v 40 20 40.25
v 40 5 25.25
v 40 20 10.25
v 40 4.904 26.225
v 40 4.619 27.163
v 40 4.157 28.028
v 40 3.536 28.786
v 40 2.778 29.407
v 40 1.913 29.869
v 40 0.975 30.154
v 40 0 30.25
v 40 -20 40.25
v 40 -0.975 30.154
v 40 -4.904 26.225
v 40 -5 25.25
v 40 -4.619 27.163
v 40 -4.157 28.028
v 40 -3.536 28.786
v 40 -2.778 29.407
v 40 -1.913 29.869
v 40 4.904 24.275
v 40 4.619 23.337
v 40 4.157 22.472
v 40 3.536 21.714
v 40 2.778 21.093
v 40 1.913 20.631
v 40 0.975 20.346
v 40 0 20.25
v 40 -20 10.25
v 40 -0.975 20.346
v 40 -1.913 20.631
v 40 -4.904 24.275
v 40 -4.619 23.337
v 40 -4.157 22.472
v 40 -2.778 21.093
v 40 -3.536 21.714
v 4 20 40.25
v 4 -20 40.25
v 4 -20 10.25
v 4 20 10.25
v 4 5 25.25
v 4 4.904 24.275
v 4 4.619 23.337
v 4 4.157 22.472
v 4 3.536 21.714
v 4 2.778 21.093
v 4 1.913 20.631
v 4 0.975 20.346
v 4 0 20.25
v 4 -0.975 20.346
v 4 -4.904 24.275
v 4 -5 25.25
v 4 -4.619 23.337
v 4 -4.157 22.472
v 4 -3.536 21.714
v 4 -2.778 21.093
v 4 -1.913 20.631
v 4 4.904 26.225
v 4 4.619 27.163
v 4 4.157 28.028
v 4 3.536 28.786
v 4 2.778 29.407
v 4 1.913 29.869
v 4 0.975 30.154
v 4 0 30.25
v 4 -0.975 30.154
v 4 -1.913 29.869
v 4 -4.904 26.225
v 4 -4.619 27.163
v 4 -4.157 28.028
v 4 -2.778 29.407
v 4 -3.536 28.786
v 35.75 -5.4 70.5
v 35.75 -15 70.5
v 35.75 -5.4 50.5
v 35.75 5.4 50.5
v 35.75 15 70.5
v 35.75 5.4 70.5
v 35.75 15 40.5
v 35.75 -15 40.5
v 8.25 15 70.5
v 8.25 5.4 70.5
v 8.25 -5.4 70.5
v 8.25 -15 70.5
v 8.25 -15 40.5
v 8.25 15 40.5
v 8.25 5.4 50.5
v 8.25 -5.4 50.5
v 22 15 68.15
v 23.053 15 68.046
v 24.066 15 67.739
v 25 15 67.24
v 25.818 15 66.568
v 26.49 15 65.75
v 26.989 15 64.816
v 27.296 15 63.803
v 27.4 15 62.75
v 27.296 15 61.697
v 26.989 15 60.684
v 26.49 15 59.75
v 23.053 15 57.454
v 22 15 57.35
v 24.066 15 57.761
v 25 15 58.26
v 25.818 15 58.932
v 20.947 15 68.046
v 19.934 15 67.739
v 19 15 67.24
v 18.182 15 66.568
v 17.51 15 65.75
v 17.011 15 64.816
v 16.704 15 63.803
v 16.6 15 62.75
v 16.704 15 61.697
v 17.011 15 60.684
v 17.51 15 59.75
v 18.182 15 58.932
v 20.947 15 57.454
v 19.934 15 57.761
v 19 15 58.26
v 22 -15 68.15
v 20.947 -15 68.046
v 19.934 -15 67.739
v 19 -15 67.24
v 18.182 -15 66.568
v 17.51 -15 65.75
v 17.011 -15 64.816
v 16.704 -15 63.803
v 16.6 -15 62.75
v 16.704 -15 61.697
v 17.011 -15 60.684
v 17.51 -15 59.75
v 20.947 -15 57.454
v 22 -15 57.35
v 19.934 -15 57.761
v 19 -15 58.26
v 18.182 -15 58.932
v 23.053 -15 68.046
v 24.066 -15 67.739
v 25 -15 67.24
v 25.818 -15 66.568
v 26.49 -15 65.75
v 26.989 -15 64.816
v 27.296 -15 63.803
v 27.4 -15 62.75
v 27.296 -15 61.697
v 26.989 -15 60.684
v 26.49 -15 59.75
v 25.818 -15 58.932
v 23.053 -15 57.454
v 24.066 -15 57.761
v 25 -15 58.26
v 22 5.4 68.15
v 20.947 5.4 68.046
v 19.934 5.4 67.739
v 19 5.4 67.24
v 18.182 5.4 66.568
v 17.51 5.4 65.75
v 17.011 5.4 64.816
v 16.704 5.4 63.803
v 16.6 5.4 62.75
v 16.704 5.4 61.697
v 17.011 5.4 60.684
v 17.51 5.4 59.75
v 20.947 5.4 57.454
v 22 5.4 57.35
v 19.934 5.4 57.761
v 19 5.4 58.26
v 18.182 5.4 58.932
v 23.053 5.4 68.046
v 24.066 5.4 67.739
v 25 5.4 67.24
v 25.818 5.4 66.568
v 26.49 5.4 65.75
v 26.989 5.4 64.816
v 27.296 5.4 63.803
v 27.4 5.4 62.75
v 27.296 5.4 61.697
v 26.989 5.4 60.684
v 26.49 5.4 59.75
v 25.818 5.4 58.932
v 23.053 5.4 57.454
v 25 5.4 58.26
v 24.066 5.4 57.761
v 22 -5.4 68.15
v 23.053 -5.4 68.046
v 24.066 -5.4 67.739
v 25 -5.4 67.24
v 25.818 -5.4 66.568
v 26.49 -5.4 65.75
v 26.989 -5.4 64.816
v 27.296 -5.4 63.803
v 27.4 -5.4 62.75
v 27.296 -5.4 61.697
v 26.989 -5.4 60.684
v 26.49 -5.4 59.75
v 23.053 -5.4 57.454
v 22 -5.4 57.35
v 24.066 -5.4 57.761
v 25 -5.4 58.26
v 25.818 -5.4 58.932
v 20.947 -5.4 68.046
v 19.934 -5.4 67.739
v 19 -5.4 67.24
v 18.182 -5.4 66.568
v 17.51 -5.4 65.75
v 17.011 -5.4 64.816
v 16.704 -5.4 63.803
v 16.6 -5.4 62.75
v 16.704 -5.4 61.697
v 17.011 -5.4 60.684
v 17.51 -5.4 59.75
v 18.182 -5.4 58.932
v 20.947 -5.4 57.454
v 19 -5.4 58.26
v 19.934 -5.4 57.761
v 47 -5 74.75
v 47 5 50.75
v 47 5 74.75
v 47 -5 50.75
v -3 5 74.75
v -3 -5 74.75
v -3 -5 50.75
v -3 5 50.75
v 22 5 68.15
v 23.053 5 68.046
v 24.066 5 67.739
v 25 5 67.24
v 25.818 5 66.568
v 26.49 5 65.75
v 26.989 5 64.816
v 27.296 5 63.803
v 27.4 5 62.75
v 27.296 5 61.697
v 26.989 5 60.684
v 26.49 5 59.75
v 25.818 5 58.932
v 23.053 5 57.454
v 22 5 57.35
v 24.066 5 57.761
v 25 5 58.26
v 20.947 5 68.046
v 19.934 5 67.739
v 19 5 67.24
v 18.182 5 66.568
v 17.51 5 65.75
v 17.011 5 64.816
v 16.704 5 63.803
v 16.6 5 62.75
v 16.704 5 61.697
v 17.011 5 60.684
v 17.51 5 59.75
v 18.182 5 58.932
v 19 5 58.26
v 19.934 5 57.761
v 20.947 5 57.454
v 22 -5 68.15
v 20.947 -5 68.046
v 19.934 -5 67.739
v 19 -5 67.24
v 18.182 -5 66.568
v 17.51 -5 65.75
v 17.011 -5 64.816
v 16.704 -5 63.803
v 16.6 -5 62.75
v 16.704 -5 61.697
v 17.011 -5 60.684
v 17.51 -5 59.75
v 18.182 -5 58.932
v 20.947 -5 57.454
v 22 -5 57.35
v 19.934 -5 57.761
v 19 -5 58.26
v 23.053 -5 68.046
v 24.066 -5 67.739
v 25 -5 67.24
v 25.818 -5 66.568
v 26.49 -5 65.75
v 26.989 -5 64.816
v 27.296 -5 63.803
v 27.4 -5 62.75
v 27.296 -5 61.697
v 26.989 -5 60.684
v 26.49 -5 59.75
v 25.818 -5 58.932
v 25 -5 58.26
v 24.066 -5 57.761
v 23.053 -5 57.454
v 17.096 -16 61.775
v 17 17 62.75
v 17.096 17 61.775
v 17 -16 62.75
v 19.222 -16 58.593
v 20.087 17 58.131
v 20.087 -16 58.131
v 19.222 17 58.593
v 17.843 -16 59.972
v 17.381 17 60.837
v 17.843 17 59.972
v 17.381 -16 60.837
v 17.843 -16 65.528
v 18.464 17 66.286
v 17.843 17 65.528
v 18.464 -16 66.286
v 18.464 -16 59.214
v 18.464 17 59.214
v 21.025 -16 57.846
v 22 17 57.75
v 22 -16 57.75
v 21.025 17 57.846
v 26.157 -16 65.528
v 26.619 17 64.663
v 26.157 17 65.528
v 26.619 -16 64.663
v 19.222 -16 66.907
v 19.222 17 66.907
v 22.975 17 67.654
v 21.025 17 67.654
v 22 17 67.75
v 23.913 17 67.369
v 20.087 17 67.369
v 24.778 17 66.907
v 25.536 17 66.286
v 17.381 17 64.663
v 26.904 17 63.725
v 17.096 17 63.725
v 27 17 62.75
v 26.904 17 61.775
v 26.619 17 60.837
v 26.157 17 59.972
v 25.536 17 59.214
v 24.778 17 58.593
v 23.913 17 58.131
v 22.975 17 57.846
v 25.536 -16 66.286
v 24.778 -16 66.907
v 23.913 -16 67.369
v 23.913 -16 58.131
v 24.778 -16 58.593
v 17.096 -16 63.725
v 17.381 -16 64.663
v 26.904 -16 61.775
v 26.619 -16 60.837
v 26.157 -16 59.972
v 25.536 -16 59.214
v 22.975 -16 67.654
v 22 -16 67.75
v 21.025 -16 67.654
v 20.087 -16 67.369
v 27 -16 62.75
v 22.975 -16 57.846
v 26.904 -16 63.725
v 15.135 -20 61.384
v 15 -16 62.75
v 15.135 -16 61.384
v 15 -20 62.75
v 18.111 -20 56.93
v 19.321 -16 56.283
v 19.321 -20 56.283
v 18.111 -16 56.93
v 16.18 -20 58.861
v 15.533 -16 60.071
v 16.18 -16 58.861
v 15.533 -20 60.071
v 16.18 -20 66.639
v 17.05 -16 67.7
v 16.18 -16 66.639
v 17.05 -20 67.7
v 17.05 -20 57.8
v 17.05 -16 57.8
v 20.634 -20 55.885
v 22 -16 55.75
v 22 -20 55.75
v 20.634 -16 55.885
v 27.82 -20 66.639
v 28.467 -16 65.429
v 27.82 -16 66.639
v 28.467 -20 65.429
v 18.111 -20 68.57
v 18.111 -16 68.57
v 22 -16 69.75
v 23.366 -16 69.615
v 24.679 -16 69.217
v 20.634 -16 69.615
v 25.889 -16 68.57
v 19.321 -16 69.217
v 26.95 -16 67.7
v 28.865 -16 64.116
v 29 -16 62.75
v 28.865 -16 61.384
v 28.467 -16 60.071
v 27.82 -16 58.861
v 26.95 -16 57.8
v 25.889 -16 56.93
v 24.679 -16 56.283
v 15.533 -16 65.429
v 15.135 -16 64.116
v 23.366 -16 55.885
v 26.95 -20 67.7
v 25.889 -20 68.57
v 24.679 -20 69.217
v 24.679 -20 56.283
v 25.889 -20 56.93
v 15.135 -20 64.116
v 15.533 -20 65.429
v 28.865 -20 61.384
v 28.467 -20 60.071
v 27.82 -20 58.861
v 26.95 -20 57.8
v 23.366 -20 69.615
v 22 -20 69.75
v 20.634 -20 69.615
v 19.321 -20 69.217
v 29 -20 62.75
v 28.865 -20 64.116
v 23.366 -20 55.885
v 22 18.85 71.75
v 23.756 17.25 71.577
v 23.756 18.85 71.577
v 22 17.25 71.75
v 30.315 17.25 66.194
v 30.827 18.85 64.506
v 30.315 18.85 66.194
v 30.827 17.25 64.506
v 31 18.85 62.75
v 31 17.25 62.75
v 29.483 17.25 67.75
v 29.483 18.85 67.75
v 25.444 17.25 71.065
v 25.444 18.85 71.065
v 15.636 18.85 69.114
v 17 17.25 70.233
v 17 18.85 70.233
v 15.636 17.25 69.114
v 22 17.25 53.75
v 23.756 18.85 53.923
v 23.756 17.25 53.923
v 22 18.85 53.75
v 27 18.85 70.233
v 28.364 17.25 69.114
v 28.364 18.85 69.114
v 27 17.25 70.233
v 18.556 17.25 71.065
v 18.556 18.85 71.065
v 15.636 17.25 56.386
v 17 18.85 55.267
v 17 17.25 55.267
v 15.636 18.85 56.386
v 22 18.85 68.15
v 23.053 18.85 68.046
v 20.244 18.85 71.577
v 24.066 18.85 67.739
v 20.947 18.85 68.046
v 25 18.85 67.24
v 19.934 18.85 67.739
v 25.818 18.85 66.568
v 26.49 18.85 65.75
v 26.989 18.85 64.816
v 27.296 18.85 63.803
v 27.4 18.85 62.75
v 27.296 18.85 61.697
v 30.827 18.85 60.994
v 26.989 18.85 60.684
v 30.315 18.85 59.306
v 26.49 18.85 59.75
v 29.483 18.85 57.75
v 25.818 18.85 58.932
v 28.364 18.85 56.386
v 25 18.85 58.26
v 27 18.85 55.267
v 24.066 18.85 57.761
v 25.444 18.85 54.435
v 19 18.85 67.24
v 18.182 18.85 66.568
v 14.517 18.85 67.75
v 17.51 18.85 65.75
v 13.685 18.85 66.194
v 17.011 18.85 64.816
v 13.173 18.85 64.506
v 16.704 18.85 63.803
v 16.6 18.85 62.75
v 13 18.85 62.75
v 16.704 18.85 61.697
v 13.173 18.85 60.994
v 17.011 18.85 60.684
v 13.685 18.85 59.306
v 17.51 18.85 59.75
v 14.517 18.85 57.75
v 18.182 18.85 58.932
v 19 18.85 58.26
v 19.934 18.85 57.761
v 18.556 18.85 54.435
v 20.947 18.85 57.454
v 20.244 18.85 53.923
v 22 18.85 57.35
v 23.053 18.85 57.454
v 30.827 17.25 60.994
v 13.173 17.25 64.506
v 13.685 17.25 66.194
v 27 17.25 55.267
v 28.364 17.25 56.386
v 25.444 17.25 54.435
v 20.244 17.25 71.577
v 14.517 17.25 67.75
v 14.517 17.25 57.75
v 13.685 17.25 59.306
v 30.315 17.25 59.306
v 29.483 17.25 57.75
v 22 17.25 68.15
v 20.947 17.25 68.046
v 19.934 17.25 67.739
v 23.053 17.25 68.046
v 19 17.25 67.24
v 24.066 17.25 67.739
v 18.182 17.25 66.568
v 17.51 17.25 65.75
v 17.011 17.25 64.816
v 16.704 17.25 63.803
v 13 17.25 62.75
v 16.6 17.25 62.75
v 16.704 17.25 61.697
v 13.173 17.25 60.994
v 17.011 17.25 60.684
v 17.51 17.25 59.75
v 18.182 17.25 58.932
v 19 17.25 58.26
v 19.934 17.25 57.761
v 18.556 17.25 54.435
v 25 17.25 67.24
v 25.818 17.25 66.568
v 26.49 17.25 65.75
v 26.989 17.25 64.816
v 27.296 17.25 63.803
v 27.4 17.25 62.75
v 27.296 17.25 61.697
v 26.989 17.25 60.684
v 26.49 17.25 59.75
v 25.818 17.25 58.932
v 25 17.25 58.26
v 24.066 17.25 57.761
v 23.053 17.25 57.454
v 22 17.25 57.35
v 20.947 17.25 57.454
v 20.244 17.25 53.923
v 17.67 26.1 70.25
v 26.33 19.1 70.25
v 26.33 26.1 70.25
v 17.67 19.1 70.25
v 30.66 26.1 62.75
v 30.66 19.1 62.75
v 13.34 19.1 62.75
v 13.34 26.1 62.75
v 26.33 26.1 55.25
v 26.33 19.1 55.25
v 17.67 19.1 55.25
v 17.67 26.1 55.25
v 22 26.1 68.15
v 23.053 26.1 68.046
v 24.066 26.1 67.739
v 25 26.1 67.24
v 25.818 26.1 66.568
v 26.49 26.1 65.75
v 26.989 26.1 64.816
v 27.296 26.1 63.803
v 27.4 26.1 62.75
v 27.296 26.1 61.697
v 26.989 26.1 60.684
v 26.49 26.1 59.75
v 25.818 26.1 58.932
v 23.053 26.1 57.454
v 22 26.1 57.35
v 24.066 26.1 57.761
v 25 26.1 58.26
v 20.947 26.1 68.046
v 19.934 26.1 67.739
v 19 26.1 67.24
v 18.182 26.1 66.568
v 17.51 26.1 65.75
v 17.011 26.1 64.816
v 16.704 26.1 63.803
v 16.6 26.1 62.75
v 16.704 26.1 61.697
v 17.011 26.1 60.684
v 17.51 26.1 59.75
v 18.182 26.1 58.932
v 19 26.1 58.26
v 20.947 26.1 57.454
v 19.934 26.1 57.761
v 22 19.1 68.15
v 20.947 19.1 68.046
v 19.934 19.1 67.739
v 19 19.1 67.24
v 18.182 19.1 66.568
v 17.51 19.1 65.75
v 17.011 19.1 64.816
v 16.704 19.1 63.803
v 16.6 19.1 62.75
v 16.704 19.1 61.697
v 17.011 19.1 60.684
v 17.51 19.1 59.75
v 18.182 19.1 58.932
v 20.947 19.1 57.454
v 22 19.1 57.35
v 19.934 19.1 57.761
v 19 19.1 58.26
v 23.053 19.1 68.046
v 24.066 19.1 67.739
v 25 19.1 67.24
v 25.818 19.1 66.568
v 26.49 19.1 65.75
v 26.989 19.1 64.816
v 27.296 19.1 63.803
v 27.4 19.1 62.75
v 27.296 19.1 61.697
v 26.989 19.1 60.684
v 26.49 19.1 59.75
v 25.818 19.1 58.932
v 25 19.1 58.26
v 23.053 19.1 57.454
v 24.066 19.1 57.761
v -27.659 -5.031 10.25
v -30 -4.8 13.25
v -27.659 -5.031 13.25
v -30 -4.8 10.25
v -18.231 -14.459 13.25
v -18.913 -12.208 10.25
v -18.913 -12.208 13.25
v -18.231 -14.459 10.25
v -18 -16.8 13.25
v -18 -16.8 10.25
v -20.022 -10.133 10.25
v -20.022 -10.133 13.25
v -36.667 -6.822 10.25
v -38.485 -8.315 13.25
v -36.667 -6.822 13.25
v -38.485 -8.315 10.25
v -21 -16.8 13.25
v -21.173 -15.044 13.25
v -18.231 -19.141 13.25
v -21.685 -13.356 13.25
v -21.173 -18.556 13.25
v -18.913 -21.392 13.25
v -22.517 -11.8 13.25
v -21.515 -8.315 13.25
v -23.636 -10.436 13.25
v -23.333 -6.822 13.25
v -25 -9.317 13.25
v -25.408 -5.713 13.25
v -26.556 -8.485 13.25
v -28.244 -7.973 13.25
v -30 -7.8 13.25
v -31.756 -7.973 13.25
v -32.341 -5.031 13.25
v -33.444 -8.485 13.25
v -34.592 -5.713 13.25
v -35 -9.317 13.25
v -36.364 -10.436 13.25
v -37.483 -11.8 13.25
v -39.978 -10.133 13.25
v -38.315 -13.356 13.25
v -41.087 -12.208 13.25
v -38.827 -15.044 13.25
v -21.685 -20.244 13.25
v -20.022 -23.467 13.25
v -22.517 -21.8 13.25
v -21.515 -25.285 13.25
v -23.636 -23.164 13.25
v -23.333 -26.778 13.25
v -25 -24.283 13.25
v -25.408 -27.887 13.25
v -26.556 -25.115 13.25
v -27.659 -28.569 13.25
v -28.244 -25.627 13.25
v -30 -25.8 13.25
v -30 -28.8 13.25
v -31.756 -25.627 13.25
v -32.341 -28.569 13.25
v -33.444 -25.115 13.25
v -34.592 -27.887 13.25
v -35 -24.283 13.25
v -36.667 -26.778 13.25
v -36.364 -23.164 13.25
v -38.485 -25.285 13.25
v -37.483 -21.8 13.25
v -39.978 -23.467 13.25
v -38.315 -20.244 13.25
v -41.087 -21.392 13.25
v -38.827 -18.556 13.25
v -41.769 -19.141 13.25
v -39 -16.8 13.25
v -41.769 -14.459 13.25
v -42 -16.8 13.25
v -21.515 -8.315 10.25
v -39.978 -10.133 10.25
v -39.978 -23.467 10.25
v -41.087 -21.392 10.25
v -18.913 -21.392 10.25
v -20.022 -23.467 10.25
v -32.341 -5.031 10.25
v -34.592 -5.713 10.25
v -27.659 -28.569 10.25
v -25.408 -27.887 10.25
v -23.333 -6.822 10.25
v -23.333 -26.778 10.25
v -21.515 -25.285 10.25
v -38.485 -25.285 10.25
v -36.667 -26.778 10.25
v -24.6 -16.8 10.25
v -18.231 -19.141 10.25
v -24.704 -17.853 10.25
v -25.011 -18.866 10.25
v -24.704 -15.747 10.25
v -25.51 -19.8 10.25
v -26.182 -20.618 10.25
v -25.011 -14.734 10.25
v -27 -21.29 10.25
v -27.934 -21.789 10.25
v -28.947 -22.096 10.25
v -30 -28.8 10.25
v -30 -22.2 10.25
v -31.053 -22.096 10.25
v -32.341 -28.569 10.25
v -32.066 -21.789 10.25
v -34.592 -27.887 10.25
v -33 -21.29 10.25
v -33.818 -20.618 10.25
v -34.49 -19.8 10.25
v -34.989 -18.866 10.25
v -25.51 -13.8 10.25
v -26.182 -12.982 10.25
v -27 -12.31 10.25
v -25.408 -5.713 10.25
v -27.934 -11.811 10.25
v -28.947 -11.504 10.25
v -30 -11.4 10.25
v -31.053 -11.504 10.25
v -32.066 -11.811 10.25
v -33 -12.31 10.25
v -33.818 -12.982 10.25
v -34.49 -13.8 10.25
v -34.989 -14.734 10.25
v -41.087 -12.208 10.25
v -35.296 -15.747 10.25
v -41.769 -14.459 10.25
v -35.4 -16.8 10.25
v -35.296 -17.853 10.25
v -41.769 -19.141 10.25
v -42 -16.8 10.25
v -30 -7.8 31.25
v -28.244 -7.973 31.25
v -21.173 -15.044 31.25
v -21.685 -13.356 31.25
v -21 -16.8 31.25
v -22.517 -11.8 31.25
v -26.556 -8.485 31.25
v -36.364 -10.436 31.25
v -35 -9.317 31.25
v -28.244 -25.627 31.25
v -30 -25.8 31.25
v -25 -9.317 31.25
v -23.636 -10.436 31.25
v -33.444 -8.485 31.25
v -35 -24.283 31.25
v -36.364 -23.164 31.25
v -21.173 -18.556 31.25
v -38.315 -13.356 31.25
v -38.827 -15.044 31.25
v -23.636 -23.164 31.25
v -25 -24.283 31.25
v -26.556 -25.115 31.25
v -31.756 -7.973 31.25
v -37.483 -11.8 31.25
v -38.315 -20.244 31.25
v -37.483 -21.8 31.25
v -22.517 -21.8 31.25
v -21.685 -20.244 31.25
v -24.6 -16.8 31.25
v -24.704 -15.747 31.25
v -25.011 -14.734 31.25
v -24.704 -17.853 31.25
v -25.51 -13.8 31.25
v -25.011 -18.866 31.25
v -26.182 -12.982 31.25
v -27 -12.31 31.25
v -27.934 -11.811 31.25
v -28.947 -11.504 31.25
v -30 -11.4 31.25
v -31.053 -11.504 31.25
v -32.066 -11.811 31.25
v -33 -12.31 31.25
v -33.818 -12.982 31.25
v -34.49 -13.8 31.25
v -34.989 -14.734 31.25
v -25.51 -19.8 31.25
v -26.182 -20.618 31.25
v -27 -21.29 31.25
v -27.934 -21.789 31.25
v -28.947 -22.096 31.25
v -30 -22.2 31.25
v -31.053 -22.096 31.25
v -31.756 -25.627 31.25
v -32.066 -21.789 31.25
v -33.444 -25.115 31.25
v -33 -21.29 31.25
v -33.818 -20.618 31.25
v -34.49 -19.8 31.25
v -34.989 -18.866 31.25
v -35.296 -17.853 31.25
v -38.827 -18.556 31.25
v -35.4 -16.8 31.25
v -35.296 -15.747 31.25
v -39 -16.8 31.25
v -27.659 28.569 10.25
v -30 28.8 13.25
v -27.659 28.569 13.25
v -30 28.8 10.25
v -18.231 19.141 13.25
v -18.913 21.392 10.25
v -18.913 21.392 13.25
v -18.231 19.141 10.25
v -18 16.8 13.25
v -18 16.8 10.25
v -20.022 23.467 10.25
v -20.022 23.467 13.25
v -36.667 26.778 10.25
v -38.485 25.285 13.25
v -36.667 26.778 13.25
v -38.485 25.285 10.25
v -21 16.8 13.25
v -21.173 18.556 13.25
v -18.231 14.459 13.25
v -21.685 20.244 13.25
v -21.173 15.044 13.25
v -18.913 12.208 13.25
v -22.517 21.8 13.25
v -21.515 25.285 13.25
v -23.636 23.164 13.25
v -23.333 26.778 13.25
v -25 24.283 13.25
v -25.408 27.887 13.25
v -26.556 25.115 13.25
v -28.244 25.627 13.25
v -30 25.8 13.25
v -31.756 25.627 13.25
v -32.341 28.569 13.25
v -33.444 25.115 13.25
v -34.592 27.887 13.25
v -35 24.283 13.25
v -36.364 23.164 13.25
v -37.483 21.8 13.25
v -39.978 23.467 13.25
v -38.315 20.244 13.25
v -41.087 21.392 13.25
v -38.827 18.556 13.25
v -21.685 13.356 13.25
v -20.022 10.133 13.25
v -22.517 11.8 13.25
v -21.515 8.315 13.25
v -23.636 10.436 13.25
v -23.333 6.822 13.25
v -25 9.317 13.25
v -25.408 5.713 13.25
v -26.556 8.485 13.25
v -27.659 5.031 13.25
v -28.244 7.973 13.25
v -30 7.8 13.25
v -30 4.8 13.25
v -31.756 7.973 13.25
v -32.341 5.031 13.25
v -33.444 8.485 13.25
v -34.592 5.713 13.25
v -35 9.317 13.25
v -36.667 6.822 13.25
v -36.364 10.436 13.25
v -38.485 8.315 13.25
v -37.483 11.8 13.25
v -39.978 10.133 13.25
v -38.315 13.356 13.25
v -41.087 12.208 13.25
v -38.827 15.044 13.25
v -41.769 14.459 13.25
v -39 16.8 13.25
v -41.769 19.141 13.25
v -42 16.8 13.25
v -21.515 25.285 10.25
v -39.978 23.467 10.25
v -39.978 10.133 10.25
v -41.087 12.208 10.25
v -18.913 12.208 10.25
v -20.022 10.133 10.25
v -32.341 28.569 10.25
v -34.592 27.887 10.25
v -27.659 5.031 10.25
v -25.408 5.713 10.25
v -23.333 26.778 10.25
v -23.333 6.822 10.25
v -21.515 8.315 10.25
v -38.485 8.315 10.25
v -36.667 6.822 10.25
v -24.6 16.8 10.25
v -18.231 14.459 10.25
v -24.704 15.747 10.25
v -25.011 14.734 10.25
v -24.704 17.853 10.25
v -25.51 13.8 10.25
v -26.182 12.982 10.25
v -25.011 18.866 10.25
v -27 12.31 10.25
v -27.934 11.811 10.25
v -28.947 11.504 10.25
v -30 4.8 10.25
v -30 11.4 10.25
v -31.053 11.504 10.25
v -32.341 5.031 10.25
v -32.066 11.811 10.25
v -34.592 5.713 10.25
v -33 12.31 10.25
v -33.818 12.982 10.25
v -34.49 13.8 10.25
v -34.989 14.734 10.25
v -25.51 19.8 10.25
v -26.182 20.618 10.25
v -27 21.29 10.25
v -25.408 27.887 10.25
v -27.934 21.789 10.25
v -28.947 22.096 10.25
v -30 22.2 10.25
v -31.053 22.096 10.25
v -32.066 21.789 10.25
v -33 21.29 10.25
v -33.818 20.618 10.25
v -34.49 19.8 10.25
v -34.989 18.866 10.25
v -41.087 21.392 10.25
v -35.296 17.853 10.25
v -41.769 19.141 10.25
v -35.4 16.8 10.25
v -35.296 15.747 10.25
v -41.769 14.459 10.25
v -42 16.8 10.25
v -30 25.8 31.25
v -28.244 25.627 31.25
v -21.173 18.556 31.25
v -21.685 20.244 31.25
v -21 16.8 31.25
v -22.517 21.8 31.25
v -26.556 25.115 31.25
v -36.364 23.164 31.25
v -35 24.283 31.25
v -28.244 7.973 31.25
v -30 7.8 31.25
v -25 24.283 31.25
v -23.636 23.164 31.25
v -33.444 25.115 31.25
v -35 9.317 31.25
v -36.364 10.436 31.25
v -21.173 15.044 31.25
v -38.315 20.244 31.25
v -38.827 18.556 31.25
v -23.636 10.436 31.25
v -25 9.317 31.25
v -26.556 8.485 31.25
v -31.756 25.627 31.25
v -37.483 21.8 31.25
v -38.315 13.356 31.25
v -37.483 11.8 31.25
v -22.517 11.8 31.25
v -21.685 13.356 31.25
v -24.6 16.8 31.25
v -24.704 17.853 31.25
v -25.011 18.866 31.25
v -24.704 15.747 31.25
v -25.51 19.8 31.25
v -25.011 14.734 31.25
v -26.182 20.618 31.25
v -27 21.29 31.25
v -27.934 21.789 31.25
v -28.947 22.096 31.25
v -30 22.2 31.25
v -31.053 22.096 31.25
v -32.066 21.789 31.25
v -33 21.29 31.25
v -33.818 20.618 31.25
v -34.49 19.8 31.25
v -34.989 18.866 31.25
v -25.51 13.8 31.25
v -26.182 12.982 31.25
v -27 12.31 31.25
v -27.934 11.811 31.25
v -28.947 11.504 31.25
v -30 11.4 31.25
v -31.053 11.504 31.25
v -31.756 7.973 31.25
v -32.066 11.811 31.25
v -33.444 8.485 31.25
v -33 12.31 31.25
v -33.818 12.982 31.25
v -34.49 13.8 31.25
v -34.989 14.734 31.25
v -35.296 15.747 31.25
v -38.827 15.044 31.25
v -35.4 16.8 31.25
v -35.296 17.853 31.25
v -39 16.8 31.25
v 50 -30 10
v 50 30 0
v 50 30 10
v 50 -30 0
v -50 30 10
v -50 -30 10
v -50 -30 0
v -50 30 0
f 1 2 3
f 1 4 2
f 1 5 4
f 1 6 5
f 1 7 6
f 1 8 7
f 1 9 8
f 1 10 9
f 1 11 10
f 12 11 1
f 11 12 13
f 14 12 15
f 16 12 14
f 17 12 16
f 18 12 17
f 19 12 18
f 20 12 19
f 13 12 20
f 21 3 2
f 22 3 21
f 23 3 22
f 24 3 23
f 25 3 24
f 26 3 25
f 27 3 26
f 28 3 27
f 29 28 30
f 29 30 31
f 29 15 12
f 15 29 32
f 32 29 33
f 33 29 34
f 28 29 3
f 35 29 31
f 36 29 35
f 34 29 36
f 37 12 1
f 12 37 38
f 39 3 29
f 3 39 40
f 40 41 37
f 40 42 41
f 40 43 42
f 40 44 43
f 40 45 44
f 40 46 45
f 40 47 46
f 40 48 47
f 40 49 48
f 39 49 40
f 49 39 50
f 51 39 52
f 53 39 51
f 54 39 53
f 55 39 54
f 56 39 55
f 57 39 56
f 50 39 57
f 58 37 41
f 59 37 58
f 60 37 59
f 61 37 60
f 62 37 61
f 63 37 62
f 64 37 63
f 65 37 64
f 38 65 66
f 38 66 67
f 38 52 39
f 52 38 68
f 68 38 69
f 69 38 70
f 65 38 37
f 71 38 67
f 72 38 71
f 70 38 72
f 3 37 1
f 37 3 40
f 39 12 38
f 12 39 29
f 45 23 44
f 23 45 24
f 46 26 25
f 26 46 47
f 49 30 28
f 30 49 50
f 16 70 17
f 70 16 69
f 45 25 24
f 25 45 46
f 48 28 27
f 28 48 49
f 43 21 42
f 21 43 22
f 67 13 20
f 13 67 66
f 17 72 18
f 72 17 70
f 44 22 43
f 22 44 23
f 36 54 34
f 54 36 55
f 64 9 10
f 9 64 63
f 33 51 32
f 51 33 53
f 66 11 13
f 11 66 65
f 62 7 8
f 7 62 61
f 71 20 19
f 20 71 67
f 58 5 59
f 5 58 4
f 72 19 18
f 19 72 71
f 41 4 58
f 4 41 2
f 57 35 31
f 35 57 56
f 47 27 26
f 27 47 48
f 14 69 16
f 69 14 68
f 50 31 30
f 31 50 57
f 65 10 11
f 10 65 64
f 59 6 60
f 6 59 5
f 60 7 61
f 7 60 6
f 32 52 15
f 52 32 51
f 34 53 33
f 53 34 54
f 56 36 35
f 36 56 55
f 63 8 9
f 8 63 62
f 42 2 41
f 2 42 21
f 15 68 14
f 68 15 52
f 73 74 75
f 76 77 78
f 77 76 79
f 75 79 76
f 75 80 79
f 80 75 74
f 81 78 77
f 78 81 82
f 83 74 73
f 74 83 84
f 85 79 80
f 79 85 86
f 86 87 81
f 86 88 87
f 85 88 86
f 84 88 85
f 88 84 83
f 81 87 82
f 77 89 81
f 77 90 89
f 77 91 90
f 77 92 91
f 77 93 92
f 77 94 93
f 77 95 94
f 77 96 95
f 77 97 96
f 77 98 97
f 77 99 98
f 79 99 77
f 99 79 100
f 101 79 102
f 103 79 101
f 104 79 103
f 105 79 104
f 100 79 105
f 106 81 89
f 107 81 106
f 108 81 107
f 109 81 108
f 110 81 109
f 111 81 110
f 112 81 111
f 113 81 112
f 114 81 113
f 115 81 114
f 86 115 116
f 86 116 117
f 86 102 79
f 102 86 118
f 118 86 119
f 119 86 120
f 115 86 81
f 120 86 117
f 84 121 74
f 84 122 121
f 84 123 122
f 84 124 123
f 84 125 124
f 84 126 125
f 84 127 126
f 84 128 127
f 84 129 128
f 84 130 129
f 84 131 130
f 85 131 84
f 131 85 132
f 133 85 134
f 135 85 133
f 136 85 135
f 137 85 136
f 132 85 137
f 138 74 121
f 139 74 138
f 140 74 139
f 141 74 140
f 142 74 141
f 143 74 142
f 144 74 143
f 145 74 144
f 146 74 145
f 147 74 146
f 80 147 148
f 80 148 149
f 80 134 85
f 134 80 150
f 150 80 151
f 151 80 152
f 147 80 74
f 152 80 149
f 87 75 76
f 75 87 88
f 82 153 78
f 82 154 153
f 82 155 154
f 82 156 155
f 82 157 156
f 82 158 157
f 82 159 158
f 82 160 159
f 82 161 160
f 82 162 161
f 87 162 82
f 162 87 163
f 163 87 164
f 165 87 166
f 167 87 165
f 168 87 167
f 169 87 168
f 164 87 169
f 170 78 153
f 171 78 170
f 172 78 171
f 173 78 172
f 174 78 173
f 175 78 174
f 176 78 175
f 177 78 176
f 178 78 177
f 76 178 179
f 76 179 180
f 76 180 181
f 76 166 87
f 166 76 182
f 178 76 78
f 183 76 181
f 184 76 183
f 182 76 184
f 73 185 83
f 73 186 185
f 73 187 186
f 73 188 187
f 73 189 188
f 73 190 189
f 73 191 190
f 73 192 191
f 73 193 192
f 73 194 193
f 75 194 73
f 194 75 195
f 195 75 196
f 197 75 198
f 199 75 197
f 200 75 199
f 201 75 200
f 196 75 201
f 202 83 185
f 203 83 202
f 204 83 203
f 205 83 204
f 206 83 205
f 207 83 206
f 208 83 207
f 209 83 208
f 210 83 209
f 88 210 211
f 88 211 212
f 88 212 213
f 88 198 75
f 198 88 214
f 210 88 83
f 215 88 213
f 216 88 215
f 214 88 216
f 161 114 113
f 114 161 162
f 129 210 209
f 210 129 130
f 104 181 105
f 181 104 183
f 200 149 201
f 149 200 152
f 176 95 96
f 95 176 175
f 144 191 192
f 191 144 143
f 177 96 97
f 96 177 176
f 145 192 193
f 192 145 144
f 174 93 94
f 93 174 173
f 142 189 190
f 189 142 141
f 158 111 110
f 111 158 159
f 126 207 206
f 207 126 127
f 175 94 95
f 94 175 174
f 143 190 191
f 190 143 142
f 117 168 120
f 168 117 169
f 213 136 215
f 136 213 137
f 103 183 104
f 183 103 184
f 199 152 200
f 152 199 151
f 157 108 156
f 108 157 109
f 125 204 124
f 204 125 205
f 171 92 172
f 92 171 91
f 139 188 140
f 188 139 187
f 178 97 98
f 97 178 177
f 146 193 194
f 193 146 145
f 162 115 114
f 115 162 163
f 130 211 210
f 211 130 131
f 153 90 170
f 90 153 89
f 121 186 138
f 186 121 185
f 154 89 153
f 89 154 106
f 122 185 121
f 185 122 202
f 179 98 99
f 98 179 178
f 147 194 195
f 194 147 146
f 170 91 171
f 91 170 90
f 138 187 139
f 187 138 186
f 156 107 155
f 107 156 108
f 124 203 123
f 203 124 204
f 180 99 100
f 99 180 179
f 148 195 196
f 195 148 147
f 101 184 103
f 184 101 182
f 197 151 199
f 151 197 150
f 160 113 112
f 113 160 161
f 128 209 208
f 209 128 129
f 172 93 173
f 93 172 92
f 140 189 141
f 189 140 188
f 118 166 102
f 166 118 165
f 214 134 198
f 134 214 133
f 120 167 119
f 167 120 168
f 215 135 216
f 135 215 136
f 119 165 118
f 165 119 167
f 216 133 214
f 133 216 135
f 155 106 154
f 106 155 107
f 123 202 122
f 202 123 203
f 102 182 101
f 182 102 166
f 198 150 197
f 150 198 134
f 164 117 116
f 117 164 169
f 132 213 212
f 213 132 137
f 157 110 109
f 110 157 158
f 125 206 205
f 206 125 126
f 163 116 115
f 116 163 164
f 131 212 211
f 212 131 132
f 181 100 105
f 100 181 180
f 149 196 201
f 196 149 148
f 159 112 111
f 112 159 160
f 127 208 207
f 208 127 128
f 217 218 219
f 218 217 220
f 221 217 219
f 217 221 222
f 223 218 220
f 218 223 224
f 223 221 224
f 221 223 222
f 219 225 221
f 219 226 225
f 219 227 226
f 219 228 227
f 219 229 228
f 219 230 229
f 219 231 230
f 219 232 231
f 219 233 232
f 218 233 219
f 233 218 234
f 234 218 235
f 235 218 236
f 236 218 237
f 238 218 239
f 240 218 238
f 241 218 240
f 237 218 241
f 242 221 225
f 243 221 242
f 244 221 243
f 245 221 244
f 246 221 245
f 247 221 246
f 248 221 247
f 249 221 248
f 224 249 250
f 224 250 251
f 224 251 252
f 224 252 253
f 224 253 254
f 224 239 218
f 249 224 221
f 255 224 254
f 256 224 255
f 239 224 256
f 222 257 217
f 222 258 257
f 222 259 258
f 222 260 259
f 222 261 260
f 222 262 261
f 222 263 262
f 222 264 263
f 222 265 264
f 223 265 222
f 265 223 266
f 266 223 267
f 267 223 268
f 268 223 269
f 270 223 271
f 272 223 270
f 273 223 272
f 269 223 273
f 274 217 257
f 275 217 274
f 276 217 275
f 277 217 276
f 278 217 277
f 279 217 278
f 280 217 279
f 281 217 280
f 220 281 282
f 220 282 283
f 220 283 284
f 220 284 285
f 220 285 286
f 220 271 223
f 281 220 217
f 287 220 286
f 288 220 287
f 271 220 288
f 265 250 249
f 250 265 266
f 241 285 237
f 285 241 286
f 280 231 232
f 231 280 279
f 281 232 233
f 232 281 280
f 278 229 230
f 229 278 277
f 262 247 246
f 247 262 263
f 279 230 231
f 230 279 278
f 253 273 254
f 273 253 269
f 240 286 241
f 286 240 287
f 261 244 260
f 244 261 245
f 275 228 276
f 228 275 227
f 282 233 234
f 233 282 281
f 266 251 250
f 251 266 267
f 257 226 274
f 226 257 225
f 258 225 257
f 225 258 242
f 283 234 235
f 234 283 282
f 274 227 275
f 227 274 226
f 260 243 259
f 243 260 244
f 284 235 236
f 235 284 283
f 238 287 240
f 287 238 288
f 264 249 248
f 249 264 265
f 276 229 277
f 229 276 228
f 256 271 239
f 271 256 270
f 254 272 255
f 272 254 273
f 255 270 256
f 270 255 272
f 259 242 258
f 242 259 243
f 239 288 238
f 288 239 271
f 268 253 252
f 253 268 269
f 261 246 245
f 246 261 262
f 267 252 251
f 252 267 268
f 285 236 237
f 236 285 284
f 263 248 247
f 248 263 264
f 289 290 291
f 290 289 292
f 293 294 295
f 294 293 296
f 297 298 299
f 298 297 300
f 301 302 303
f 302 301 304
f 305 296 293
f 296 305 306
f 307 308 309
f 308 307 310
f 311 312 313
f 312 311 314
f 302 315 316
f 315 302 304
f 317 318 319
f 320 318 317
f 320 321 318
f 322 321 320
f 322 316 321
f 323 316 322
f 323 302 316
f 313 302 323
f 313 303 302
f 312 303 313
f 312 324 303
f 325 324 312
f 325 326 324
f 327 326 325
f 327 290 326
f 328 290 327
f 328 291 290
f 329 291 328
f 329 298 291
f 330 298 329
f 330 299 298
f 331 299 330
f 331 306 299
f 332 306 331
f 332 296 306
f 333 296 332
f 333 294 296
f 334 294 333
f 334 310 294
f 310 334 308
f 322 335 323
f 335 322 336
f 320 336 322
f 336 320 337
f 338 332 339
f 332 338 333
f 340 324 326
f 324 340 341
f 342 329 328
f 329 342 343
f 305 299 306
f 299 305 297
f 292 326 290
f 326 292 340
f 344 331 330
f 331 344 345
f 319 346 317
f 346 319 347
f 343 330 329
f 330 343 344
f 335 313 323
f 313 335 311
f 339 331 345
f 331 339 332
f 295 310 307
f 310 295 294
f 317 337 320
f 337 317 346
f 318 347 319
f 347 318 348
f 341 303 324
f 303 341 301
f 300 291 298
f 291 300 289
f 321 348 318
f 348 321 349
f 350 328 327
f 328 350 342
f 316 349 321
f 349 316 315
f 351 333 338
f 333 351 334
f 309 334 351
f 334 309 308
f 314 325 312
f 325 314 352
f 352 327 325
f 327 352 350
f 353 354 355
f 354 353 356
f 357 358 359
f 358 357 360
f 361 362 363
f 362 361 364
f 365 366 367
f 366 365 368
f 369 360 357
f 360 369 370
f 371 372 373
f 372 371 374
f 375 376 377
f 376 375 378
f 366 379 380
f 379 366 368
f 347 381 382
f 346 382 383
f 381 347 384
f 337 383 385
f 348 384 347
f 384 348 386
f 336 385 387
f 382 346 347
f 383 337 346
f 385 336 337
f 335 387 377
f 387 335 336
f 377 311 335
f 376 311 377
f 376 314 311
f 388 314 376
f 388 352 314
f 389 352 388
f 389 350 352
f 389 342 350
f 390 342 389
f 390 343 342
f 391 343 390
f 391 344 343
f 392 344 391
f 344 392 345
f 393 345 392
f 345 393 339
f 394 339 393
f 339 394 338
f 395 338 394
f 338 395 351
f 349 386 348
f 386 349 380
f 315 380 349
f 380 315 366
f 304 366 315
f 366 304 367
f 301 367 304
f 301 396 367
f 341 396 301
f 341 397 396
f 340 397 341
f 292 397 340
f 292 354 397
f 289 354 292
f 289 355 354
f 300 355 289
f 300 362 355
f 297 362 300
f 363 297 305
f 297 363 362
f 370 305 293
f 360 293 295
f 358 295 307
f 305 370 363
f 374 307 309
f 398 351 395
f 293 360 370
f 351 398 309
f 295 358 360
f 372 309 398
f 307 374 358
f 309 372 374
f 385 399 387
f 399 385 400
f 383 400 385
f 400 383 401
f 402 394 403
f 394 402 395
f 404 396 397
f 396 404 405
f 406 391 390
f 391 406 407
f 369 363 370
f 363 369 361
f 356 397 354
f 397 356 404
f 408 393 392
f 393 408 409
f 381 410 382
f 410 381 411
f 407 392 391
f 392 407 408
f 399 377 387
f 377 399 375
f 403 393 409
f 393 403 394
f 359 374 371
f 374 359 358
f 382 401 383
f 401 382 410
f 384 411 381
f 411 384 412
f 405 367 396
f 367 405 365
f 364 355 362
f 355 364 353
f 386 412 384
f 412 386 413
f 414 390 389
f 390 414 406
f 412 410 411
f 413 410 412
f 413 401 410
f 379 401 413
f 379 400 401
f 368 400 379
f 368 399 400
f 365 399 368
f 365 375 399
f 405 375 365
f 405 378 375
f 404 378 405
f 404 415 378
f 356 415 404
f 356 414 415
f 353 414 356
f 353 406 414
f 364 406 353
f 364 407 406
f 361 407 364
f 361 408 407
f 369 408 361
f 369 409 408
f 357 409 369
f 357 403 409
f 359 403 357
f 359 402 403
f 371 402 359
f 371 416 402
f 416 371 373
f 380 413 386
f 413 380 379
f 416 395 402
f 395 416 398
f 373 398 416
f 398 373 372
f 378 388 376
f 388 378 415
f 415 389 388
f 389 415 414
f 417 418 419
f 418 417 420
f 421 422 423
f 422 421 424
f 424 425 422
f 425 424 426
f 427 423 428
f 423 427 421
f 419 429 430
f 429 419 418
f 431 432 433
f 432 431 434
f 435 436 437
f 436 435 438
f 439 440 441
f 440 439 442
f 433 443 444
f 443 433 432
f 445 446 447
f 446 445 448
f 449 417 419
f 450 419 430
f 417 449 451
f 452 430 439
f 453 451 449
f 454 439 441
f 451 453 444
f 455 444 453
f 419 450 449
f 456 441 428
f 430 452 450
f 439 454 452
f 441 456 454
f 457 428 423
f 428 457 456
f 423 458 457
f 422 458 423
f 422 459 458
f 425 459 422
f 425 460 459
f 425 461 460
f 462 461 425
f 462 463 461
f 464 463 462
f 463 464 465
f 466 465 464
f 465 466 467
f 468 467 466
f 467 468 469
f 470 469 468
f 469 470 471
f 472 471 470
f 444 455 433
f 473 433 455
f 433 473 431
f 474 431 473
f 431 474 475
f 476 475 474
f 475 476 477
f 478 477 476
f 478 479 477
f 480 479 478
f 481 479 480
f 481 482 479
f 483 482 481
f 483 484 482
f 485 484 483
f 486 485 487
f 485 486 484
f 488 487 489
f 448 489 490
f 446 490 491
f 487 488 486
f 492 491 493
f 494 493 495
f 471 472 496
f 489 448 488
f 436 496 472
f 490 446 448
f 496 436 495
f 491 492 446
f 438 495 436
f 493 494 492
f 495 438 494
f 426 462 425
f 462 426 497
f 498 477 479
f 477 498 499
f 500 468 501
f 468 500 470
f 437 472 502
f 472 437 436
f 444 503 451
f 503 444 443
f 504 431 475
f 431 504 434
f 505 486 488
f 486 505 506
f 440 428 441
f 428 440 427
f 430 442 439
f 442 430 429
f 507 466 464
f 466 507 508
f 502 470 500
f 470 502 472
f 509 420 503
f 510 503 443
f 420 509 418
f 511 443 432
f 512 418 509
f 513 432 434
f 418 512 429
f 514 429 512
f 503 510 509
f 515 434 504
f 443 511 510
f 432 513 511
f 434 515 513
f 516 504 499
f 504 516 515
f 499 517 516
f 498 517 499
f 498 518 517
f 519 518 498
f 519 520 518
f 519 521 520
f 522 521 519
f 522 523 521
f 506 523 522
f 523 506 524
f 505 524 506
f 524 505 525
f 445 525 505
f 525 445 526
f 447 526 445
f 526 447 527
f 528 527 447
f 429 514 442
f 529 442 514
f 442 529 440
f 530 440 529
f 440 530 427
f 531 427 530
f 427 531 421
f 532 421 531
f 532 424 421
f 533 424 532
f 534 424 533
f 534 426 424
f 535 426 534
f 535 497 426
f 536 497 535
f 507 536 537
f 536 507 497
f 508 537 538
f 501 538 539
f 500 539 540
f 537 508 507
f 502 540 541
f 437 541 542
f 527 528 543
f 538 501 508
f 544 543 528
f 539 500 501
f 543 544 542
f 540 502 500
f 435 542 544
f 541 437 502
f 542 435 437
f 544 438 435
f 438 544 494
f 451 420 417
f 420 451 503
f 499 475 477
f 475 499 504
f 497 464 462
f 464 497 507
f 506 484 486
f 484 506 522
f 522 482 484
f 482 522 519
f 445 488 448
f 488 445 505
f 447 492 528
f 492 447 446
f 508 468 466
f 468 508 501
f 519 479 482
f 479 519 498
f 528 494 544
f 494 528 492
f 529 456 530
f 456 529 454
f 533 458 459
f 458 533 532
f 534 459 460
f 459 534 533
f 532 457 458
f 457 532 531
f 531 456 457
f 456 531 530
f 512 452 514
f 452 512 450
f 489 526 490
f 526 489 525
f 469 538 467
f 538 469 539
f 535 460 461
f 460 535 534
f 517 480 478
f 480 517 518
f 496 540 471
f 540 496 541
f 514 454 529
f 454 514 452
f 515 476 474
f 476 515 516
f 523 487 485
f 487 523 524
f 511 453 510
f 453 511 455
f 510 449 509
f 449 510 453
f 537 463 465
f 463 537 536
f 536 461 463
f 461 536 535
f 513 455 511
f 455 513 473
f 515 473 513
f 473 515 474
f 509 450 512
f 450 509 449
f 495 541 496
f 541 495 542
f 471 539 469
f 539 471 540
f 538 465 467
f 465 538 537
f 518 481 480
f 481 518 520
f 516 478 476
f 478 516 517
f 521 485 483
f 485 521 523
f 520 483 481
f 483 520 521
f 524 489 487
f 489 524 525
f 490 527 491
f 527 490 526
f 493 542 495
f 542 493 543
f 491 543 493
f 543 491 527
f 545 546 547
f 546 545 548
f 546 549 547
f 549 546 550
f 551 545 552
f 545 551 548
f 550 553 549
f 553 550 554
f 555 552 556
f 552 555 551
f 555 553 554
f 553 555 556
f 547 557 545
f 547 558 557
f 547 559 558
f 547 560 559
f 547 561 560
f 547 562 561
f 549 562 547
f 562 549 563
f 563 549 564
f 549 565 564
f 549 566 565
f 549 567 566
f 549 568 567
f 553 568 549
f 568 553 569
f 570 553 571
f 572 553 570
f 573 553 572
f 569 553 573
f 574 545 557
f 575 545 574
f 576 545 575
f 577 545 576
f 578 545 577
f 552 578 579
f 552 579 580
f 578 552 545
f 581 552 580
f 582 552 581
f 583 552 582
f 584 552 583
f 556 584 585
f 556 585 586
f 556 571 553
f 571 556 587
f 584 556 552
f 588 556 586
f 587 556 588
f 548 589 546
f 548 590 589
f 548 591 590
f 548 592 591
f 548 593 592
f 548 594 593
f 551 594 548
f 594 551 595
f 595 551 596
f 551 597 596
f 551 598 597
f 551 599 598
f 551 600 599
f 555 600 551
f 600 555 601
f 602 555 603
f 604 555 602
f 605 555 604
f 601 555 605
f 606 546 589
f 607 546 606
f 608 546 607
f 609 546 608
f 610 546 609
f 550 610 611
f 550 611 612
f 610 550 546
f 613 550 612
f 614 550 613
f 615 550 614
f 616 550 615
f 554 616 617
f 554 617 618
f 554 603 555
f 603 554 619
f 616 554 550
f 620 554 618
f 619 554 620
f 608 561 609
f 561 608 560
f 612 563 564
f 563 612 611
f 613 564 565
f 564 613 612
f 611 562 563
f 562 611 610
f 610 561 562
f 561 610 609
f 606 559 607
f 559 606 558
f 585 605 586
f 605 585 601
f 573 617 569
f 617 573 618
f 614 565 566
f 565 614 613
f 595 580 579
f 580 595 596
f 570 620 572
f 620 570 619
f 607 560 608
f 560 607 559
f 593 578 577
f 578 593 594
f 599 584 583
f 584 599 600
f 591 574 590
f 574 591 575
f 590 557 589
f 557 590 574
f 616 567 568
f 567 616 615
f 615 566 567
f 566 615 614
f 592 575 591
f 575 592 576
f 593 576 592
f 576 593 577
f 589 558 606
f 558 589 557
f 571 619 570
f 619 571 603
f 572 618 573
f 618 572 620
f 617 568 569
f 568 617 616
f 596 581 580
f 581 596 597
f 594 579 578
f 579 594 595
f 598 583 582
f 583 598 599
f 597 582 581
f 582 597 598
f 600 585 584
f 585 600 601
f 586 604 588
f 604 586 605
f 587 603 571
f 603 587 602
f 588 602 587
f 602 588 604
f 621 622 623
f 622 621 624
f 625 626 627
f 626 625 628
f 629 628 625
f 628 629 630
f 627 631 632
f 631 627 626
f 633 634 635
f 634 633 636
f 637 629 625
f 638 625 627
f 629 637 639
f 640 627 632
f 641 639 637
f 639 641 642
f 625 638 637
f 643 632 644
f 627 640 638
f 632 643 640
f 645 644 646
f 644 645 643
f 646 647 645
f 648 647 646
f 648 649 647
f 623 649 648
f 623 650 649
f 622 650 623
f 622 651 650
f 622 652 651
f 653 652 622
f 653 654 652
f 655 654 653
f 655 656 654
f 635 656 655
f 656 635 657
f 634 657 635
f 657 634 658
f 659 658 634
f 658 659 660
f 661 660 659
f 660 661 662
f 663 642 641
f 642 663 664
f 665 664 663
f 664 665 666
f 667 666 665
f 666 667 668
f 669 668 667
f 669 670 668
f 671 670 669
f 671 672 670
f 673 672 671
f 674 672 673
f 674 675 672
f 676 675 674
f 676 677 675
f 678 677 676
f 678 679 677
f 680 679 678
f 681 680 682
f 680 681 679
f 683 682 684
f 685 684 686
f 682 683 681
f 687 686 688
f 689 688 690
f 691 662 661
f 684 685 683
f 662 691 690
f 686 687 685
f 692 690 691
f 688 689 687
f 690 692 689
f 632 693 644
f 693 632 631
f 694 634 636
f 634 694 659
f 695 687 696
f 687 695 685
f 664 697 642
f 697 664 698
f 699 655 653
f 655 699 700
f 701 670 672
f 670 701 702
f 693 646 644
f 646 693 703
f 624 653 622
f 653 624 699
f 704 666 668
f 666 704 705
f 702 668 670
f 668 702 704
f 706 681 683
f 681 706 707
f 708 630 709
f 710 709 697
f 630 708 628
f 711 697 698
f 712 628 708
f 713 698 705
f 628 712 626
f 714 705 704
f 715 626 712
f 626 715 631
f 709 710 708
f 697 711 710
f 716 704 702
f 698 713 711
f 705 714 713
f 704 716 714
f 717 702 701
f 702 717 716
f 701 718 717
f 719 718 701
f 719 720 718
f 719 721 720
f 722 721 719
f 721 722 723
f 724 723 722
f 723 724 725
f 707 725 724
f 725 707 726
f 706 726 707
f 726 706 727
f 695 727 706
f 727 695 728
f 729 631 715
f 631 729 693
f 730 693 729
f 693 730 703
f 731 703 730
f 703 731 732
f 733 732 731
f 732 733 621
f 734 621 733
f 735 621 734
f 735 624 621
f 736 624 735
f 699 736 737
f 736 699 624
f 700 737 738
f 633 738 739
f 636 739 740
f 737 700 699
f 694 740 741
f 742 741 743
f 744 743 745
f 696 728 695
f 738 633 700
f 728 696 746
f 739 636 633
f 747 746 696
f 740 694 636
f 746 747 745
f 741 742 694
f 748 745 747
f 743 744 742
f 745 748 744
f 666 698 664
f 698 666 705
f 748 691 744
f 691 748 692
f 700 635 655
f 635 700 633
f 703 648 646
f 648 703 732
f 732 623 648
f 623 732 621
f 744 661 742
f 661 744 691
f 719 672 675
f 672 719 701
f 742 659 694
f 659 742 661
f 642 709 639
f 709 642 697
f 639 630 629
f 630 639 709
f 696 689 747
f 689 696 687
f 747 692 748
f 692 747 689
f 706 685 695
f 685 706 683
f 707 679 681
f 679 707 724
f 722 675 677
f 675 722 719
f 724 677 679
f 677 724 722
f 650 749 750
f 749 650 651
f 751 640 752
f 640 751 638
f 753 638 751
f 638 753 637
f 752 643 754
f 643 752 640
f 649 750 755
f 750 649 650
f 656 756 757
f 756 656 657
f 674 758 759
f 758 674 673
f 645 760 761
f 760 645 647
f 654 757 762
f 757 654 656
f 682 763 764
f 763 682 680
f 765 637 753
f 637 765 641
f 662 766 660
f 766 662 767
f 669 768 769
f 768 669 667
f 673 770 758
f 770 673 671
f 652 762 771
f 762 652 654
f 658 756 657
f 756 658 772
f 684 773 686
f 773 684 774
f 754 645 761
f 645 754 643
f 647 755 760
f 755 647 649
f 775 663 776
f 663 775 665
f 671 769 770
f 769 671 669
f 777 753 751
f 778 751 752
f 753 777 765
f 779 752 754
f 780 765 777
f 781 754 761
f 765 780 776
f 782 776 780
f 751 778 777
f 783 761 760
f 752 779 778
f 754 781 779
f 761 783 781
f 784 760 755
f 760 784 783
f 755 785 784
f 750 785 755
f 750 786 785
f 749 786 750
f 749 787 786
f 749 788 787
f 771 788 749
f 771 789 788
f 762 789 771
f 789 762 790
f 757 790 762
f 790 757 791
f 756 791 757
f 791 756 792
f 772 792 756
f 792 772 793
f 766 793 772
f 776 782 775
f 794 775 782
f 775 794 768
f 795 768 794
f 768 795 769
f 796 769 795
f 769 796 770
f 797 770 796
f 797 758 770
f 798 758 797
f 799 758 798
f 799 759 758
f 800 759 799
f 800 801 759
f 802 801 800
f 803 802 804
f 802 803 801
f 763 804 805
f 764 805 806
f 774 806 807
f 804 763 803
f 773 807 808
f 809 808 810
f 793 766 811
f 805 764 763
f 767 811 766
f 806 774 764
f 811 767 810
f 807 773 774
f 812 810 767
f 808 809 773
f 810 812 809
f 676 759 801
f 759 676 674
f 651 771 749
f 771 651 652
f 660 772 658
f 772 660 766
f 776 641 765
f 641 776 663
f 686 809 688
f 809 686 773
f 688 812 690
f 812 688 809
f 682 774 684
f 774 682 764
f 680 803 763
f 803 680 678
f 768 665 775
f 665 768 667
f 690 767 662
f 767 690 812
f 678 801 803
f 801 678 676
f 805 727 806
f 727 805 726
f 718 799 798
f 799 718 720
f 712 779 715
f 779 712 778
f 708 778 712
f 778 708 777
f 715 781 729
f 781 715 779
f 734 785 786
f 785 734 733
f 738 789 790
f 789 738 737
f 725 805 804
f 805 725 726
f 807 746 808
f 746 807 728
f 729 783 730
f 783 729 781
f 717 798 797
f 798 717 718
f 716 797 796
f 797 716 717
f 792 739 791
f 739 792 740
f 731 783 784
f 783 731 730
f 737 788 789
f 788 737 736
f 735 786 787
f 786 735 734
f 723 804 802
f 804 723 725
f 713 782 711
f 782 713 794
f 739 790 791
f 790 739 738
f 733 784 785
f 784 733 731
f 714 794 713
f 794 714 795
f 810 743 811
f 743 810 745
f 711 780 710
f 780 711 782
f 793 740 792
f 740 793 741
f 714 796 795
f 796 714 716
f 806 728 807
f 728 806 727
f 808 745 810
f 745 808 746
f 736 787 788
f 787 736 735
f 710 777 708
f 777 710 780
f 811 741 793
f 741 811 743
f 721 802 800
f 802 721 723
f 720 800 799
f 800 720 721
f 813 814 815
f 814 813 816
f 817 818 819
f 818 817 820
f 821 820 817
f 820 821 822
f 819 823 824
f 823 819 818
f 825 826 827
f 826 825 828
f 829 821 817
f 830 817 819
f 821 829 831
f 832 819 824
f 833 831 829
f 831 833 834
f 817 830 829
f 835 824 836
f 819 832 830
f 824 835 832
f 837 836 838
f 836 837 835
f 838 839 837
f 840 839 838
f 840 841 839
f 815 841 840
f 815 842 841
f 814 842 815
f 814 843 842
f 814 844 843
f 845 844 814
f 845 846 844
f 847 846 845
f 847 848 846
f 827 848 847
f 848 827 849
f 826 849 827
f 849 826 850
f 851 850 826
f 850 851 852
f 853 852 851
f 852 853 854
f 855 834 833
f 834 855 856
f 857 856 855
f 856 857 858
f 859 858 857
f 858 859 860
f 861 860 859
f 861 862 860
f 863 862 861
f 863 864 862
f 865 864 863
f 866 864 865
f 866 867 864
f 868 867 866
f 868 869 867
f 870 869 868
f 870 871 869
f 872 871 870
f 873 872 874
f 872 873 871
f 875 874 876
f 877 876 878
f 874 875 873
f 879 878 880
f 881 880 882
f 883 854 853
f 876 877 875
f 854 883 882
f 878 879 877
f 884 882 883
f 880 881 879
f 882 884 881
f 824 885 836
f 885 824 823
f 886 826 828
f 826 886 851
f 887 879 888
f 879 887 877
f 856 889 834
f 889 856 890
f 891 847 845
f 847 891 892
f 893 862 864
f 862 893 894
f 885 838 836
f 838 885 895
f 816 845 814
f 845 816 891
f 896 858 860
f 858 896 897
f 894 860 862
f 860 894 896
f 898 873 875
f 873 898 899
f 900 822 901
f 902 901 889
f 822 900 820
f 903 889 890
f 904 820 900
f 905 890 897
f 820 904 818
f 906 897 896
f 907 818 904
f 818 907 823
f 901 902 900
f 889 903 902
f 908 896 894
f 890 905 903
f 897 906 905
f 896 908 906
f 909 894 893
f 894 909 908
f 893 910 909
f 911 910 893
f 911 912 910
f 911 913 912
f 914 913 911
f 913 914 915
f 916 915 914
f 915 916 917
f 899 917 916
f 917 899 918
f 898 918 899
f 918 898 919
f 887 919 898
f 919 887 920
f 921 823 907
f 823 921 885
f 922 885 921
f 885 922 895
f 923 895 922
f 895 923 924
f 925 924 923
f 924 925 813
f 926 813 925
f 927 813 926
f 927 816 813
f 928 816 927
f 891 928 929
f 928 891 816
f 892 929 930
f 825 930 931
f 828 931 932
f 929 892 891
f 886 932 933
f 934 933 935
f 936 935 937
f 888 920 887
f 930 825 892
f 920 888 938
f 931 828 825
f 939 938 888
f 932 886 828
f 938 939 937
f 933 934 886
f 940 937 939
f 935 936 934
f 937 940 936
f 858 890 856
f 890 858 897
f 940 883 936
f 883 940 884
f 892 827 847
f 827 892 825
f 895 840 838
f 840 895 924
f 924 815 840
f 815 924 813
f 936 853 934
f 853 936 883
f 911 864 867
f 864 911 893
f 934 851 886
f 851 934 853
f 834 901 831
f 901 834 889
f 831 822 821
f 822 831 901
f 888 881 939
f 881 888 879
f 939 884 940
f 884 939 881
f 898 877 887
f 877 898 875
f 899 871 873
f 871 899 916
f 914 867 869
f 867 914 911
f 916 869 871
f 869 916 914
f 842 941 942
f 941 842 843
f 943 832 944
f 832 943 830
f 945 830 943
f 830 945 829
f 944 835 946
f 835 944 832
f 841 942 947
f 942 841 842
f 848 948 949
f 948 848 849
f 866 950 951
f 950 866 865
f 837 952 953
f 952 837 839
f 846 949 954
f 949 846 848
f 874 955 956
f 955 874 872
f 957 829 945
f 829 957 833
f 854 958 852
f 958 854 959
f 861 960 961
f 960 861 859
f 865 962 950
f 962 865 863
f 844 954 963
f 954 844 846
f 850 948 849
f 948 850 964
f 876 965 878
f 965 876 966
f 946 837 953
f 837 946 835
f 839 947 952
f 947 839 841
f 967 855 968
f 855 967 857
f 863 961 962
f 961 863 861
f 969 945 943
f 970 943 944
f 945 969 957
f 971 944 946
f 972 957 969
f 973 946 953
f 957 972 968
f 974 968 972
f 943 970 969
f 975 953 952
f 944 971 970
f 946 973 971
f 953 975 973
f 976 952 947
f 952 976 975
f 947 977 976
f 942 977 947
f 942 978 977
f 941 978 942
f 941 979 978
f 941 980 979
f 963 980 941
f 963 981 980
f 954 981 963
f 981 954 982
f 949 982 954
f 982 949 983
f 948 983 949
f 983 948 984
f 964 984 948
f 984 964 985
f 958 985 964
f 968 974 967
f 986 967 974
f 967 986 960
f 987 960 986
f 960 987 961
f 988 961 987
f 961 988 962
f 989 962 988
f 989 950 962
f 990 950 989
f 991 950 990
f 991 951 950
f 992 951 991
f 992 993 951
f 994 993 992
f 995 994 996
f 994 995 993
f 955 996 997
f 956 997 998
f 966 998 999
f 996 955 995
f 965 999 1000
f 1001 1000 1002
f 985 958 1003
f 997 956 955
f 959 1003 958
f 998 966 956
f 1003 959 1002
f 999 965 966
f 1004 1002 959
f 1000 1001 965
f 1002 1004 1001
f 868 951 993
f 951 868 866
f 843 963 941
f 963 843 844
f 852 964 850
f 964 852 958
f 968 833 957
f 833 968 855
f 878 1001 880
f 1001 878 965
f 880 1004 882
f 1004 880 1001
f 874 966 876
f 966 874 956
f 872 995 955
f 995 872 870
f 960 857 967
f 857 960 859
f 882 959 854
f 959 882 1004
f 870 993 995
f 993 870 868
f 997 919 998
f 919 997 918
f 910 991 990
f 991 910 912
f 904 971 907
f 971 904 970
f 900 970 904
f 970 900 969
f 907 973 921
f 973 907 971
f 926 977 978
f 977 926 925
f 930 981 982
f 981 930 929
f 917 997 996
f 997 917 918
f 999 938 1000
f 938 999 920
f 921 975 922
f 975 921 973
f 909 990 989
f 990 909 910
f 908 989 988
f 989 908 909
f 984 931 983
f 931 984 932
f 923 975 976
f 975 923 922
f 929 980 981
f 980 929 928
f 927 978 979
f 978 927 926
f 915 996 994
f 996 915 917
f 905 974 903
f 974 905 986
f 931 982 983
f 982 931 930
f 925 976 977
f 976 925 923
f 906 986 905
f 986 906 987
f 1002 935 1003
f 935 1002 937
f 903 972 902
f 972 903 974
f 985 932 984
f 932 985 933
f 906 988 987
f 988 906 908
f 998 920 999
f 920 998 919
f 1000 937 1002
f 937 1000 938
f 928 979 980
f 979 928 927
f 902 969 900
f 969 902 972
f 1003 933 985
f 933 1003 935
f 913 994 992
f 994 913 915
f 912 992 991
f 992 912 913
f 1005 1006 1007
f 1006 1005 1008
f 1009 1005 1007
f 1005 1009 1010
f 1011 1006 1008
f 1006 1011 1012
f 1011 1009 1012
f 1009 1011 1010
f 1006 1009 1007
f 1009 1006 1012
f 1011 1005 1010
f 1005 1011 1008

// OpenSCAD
$fn = 32;

// ------------------------------------------------------------------------
// Indexing jig: plate 100 x 60 mm, pin d10
// Every part is its own module, assembly() places every instance.
// ------------------------------------------------------------------------

// --- part 1 ---
module jig_plate() {
  difference() {
    translate([-50, -30, 0]) cube([100, 60, 10]);
  }
}

// --- part 2 ---
module locator_block() {
  difference() {
    translate([-18, -20, 0]) cube([36, 40, 30]);
    translate([0, 0, 15]) rotate([0, 90, 0]) cylinder(h = 38, d = 10, center = true);
  }
}

// --- part 3 ---
module index_fork() {
  difference() {
    translate([-13.75, -15, 0]) cube([27.5, 30, 30]);
    translate([-14.75, -5.4, 10]) cube([29.5, 10.8, 21]);
    translate([0, 0, 22.25]) rotate([90, 0, 0]) cylinder(h = 32, d = 10.8, center = true);
  }
}

// --- part 4 ---
module index_arm() {
  difference() {
    translate([-25, -5, 0]) cube([50, 10, 24]);
    translate([0, 0, 12]) rotate([90, 0, 0]) cylinder(h = 12, d = 10.8, center = true);
  }
}

// --- part 5 ---
module index_pin() {
  rotate([0, 90, 0]) cylinder(h = 34, d = 10, center = true);
  translate([-20, 0, 0]) rotate([0, 90, 0]) cylinder(h = 4, d = 14);
}

// --- part 6 ---
module pin_washer() {
  difference() {
      translate([0, 0, 0]) cylinder(h = 1.6, d = 18);
      translate([0, 0, -1]) cylinder(h = 3.6, d = 10.8);
    }
}

// --- part 7 ---
module lock_nut() {
  difference() {
    linear_extrude(height = 7) polygon(points = [[8.66, 0], [4.33, 7.5], [-4.33, 7.5], [-8.66, 0], [-4.33, -7.5], [4.33, -7.5]]);
    translate([0, 0, -1]) cylinder(h = 9, d = 10.8);
  }
}

// --- part 8 ---
module guide_bush_a() {
  difference() {
    union() {
      cylinder(h = 3, d = 24);
      translate([0, 0, 3]) cylinder(h = 18, d = 18);
    }
    translate([0, 0, -1]) cylinder(h = 23, d = 10.8);
  }
}

// --- part 9 ---
module guide_bush_b() {
  difference() {
    union() {
      cylinder(h = 3, d = 24);
      translate([0, 0, 3]) cylinder(h = 18, d = 18);
    }
    translate([0, 0, -1]) cylinder(h = 23, d = 10.8);
  }
}

// --- assembly ---
module assembly() {
  color([0.80, 0.24, 0.20]) translate([0, 0, 0]) rotate([0, 0, 0]) jig_plate();
  color([0.20, 0.45, 0.75]) translate([22, 0, 10.25]) rotate([0, 0, 0]) locator_block();
  color([0.25, 0.62, 0.32]) translate([22, 0, 40.5]) rotate([0, 0, 0]) index_fork();
  color([0.92, 0.70, 0.18]) translate([22, 0, 50.75]) rotate([0, 0, 0]) index_arm();
  color([0.58, 0.35, 0.70]) translate([22, 0, 62.75]) rotate([0, 0, 90]) index_pin();
  color([0.16, 0.66, 0.66]) translate([22, 18.85, 62.75]) rotate([90, 0, 0]) pin_washer();
  color([0.85, 0.48, 0.18]) translate([22, 26.1, 62.75]) rotate([90, 0, 0]) lock_nut();
  color([0.55, 0.60, 0.65]) translate([-30, -16.8, 10.25]) rotate([0, 0, 0]) guide_bush_a();
  color([0.75, 0.30, 0.55]) translate([-30, 16.8, 10.25]) rotate([0, 0, 0]) guide_bush_b();
}

assembly();
